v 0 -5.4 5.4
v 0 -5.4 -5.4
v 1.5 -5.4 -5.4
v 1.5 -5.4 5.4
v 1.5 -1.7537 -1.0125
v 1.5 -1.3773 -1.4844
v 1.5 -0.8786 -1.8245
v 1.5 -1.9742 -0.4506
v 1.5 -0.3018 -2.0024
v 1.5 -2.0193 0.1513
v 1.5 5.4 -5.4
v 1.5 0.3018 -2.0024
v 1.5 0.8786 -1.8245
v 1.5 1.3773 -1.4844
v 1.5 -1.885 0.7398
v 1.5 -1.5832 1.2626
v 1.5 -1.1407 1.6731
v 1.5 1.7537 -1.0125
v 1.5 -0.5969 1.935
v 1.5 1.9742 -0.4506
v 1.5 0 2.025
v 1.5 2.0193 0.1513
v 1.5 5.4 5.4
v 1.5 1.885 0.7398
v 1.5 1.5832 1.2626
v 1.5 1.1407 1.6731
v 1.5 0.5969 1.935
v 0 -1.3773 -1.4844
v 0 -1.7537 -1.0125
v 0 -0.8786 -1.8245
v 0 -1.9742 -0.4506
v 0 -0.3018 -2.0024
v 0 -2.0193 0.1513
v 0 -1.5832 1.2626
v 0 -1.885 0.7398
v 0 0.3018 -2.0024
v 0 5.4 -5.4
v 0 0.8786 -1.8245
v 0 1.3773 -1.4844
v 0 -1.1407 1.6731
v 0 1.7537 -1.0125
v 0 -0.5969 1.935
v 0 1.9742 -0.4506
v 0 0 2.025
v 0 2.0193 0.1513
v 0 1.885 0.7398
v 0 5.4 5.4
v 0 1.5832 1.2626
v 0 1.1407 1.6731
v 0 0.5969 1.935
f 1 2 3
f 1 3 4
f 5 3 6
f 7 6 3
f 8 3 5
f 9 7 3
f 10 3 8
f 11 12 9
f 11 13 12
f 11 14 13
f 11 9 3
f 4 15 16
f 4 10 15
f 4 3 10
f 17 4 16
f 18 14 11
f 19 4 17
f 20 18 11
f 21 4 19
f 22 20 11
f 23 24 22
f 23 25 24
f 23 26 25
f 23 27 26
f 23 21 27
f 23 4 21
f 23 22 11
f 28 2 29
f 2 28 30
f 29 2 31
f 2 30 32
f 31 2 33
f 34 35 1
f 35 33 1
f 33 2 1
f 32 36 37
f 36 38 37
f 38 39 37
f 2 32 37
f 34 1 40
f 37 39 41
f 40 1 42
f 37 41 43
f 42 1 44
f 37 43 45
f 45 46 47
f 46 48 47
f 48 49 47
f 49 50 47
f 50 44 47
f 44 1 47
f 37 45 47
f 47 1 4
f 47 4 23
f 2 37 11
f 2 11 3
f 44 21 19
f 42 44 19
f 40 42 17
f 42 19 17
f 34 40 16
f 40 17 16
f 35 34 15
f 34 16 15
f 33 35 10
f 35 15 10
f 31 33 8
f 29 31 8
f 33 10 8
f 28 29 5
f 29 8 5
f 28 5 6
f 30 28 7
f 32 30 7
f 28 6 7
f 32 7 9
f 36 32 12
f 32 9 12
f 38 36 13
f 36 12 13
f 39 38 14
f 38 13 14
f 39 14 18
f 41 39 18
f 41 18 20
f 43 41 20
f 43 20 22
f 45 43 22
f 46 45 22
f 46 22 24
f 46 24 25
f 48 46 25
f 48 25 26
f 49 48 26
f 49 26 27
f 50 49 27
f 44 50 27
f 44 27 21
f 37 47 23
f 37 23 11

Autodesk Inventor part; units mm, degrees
ref_plane "YZ Plane" through (0, 0, 0) normal (1, 0, 0) x (0, 1, 0)
ref_plane "XZ Plane" through (0, 0, 0) normal (0, 1, 0) x (-1, 0, 0)
sketch "Sketch1" plane through (0, 0, 0) normal (1, 0, 0) x (0, 1, 0)
  line L0 (-5.95, 0) -> (5.95, 0) projected
  line L1 (0, -5.95) -> (0, 5.95) projected
  line L2 (-5.4, 5.4) -> (5.4, 5.4)
  line L3 (5.4, 5.4) -> (5.4, -5.4)
  line L4 (5.4, -5.4) -> (-5.4, -5.4)
  line L5 (-5.4, -5.4) -> (-5.4, 5.4)
  line L6 (0, 5.4) -> (0, -5.4) construction
  line L7 (-5.4, 0) -> (5.4, 0) construction
  point P0 (0, 0)
  dimension "d0" = 10.8
  dimension "d1" = 10.8
extrude "Body" add sketch "Sketch1" along normal blind 1.5
hole "Hole" at (0, 0, 0) direction (1, 0, 0) diameter 4.05 end through all
ref_plane "Work Plane1" through (15.347, 0, 0) normal (0, -1, 0) x (1, 0, 0)
equation "\"d0\" = SL2"
equation "\"d1\" = SL1"
equation "\"d2\" = SD"
equation "\"d4\" = SD1"
equation "\"SD1\" = 4.05"
equation "\"SL1\" = 10.8"
equation "\"SL2\" = 10.8"
equation "\"SD\" = 1.5"
equation "\"NND\" = 4"
properties part number "IFI - 4" material "Steel, Mild"
